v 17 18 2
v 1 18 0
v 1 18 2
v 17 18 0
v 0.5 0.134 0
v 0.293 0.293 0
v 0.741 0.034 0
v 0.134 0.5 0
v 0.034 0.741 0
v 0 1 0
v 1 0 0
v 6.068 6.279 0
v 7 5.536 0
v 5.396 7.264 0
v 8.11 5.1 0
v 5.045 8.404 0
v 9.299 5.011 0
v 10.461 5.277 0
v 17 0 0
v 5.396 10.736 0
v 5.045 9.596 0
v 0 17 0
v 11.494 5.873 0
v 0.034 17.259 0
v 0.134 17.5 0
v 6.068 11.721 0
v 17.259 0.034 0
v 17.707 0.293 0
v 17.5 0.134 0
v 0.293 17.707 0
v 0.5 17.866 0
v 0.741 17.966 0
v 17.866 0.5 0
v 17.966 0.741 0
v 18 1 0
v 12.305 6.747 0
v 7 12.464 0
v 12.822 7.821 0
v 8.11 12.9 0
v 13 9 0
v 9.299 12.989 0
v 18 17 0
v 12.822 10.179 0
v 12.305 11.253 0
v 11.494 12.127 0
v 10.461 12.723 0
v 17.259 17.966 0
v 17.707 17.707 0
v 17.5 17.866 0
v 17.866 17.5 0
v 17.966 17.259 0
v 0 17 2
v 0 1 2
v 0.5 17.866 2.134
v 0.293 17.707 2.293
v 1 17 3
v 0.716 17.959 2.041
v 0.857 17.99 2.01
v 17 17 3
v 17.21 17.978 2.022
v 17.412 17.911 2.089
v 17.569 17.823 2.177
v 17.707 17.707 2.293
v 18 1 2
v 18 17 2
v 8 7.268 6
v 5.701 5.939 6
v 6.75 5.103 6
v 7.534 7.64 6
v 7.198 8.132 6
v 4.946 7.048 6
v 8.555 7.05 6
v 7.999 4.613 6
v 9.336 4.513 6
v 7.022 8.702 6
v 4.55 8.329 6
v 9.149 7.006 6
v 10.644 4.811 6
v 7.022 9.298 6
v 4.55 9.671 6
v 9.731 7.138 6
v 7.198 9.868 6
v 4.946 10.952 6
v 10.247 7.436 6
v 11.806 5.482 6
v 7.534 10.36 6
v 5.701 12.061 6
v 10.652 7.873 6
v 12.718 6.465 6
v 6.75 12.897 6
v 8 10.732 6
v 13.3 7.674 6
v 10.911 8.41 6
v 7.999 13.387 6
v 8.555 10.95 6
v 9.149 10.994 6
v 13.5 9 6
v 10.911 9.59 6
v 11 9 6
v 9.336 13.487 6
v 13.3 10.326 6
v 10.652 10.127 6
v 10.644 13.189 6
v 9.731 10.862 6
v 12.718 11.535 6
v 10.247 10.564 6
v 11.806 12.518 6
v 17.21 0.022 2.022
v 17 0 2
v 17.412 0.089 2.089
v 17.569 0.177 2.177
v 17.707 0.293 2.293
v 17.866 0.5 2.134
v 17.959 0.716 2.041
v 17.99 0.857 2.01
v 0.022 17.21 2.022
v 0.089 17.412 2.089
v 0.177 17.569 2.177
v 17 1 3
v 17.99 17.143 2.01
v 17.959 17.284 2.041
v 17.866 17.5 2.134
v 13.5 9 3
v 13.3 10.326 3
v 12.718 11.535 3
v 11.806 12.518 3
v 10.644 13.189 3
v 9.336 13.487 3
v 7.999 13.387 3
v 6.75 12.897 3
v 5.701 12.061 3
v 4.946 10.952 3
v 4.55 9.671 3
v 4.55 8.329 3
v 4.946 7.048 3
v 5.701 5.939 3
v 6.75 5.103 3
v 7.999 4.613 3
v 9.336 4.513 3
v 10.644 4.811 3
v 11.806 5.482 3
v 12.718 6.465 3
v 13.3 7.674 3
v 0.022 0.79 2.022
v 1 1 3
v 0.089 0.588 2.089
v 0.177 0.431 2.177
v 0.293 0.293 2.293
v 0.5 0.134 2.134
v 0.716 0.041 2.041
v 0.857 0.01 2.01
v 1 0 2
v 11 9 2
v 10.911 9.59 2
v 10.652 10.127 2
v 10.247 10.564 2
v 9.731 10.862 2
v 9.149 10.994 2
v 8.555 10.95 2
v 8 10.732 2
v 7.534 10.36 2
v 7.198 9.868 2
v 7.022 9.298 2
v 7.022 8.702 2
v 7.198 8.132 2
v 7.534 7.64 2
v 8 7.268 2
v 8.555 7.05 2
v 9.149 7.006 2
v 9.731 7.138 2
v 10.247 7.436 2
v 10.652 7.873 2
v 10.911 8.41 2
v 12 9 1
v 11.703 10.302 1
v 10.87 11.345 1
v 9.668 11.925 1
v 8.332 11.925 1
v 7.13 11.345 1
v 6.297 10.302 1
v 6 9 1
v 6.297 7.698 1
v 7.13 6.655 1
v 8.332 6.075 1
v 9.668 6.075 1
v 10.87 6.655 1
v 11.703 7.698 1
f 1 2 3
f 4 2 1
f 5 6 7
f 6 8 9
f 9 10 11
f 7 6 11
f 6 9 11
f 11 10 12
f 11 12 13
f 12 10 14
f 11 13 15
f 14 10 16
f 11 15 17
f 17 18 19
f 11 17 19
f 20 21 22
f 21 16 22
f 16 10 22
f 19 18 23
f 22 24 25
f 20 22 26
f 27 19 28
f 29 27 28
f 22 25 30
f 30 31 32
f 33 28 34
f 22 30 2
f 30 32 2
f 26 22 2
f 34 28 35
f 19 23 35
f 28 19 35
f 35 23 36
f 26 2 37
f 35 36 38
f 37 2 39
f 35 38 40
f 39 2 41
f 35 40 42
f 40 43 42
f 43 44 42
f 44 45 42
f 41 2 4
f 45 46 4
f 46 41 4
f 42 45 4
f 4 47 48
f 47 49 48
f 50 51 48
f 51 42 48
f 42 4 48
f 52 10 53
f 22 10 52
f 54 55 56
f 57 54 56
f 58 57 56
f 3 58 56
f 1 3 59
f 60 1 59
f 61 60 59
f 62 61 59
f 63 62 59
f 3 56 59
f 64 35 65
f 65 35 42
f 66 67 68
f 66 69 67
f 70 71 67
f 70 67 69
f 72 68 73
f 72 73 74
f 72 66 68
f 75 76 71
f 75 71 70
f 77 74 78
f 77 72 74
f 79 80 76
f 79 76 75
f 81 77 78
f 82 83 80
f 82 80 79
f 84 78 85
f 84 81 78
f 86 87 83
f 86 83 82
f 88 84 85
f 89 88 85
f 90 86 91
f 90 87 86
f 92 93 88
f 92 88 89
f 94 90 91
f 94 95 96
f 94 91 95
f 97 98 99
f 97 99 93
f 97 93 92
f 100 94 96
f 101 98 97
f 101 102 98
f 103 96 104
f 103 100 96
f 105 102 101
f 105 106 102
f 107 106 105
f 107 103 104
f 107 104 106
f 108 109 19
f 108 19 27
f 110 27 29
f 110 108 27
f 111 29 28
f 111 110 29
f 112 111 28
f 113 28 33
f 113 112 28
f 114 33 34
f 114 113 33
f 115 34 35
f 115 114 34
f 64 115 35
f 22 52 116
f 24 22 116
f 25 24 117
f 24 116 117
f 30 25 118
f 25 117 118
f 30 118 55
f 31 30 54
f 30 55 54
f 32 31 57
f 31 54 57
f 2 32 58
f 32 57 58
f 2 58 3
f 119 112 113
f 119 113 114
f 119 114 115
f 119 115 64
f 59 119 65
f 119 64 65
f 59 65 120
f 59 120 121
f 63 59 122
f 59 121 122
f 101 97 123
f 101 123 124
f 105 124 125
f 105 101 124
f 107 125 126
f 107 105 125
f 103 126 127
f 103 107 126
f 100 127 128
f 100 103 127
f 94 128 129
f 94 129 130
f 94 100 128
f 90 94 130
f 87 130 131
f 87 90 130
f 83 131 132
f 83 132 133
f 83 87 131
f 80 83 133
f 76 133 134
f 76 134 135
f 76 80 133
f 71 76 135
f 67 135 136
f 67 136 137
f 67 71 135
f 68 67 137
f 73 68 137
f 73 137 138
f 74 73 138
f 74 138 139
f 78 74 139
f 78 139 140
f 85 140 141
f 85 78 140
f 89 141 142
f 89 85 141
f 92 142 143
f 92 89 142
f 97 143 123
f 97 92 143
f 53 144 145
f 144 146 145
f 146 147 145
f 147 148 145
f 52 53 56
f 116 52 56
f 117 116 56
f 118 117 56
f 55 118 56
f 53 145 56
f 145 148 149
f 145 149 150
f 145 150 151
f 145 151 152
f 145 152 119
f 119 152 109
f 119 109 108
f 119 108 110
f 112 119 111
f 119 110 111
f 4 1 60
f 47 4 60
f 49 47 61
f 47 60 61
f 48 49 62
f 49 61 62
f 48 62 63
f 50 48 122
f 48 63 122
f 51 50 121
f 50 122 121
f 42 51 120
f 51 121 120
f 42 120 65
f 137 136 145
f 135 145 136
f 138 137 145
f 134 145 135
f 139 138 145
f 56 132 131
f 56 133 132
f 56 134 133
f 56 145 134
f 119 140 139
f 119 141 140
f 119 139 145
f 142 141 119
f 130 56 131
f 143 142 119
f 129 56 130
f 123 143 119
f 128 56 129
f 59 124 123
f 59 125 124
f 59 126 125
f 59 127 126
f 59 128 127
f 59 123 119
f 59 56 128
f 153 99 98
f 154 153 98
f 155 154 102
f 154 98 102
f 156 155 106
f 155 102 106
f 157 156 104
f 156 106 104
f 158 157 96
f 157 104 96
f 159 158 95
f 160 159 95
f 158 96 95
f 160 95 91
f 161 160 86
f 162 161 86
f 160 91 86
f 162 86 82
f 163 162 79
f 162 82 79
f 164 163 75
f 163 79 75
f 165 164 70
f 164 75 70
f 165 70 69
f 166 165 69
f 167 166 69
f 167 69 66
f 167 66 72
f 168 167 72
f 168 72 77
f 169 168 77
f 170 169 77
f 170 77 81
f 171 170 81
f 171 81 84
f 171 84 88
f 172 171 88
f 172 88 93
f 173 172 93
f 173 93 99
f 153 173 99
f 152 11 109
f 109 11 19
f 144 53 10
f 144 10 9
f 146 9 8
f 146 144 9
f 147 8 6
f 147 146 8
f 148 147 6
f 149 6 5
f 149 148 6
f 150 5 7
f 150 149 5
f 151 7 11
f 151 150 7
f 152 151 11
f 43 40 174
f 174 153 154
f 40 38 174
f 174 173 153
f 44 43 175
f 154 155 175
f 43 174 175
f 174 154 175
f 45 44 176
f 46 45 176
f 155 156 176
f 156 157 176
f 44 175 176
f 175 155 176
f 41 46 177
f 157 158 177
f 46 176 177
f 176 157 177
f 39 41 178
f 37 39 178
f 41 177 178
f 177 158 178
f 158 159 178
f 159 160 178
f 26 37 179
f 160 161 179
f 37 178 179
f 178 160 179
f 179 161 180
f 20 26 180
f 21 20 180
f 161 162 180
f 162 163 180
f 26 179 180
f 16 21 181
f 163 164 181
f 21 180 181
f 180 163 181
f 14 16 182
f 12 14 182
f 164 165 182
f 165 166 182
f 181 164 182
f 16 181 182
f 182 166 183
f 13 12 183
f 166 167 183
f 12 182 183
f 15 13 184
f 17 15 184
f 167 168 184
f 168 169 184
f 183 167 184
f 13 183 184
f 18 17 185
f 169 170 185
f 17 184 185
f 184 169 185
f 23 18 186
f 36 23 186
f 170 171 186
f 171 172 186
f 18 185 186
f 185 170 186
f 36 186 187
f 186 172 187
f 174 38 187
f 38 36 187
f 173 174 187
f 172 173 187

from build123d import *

# Parameters (mm, degrees)
SKETCH_W        = 18
SKETCH_H        = 18
PAD_DEPTH       = 6
SKETCH001_W     = 18
SKETCH001_H     = 18
SKETCH001_R     = 4.5
POCKET_DEPTH    = 3
SKETCH002_R     = 2
POCKET001_DEPTH = 6.001
CHAMFER_SIZE    = 1
FILLET_R        = 1
CHAMFER001_SIZE = 2


with BuildPart() as part:
    # Sketch → Pad (new body)
    with BuildSketch(Plane.XY):
        with Locations((9, 9)):
            Rectangle(SKETCH_W, SKETCH_H)
    extrude(amount=PAD_DEPTH)

    # Sketch001 (on Face6 of Pad) → Pocket (cut)
    with BuildSketch(Plane.XY.offset(6)):
        with Locations((9, 9)):
            Rectangle(SKETCH001_W, SKETCH001_H)
        with Locations((9, 9)):
            Circle(SKETCH001_R, mode=Mode.SUBTRACT)
    extrude(amount=-POCKET_DEPTH, mode=Mode.SUBTRACT)

    # Sketch002 (on Face8 of Pocket) → Pocket001 (cut, through all)
    with BuildSketch(Plane.XY.offset(6)):
        with Locations((9, 9)):
            Circle(SKETCH002_R)
    extrude(amount=-POCKET001_DEPTH, mode=Mode.SUBTRACT)

    # Chamfer
    chamfer_edges = [part.edges().sort_by_distance(p)[0] for p in [
        (9, 0, 3),
        (18, 9, 3),
        (9, 18, 3),
        (0, 9, 3),
    ]]
    chamfer(chamfer_edges, length=CHAMFER_SIZE)

    # Fillet
    fillet_edges = [part.edges().sort_by_distance(p)[0] for p in [
        (0, 18, 1),
        (0, 0, 1),
        (18, 18, 1),
        (18, 0, 1),
    ]]
    fillet(fillet_edges, radius=FILLET_R)

    # Chamfer001
    chamfer001_edges = [part.edges().sort_by_distance(p)[0] for p in [
        (7, 9, 0),
    ]]
    chamfer(chamfer001_edges, length=CHAMFER001_SIZE)


solid = part.part
